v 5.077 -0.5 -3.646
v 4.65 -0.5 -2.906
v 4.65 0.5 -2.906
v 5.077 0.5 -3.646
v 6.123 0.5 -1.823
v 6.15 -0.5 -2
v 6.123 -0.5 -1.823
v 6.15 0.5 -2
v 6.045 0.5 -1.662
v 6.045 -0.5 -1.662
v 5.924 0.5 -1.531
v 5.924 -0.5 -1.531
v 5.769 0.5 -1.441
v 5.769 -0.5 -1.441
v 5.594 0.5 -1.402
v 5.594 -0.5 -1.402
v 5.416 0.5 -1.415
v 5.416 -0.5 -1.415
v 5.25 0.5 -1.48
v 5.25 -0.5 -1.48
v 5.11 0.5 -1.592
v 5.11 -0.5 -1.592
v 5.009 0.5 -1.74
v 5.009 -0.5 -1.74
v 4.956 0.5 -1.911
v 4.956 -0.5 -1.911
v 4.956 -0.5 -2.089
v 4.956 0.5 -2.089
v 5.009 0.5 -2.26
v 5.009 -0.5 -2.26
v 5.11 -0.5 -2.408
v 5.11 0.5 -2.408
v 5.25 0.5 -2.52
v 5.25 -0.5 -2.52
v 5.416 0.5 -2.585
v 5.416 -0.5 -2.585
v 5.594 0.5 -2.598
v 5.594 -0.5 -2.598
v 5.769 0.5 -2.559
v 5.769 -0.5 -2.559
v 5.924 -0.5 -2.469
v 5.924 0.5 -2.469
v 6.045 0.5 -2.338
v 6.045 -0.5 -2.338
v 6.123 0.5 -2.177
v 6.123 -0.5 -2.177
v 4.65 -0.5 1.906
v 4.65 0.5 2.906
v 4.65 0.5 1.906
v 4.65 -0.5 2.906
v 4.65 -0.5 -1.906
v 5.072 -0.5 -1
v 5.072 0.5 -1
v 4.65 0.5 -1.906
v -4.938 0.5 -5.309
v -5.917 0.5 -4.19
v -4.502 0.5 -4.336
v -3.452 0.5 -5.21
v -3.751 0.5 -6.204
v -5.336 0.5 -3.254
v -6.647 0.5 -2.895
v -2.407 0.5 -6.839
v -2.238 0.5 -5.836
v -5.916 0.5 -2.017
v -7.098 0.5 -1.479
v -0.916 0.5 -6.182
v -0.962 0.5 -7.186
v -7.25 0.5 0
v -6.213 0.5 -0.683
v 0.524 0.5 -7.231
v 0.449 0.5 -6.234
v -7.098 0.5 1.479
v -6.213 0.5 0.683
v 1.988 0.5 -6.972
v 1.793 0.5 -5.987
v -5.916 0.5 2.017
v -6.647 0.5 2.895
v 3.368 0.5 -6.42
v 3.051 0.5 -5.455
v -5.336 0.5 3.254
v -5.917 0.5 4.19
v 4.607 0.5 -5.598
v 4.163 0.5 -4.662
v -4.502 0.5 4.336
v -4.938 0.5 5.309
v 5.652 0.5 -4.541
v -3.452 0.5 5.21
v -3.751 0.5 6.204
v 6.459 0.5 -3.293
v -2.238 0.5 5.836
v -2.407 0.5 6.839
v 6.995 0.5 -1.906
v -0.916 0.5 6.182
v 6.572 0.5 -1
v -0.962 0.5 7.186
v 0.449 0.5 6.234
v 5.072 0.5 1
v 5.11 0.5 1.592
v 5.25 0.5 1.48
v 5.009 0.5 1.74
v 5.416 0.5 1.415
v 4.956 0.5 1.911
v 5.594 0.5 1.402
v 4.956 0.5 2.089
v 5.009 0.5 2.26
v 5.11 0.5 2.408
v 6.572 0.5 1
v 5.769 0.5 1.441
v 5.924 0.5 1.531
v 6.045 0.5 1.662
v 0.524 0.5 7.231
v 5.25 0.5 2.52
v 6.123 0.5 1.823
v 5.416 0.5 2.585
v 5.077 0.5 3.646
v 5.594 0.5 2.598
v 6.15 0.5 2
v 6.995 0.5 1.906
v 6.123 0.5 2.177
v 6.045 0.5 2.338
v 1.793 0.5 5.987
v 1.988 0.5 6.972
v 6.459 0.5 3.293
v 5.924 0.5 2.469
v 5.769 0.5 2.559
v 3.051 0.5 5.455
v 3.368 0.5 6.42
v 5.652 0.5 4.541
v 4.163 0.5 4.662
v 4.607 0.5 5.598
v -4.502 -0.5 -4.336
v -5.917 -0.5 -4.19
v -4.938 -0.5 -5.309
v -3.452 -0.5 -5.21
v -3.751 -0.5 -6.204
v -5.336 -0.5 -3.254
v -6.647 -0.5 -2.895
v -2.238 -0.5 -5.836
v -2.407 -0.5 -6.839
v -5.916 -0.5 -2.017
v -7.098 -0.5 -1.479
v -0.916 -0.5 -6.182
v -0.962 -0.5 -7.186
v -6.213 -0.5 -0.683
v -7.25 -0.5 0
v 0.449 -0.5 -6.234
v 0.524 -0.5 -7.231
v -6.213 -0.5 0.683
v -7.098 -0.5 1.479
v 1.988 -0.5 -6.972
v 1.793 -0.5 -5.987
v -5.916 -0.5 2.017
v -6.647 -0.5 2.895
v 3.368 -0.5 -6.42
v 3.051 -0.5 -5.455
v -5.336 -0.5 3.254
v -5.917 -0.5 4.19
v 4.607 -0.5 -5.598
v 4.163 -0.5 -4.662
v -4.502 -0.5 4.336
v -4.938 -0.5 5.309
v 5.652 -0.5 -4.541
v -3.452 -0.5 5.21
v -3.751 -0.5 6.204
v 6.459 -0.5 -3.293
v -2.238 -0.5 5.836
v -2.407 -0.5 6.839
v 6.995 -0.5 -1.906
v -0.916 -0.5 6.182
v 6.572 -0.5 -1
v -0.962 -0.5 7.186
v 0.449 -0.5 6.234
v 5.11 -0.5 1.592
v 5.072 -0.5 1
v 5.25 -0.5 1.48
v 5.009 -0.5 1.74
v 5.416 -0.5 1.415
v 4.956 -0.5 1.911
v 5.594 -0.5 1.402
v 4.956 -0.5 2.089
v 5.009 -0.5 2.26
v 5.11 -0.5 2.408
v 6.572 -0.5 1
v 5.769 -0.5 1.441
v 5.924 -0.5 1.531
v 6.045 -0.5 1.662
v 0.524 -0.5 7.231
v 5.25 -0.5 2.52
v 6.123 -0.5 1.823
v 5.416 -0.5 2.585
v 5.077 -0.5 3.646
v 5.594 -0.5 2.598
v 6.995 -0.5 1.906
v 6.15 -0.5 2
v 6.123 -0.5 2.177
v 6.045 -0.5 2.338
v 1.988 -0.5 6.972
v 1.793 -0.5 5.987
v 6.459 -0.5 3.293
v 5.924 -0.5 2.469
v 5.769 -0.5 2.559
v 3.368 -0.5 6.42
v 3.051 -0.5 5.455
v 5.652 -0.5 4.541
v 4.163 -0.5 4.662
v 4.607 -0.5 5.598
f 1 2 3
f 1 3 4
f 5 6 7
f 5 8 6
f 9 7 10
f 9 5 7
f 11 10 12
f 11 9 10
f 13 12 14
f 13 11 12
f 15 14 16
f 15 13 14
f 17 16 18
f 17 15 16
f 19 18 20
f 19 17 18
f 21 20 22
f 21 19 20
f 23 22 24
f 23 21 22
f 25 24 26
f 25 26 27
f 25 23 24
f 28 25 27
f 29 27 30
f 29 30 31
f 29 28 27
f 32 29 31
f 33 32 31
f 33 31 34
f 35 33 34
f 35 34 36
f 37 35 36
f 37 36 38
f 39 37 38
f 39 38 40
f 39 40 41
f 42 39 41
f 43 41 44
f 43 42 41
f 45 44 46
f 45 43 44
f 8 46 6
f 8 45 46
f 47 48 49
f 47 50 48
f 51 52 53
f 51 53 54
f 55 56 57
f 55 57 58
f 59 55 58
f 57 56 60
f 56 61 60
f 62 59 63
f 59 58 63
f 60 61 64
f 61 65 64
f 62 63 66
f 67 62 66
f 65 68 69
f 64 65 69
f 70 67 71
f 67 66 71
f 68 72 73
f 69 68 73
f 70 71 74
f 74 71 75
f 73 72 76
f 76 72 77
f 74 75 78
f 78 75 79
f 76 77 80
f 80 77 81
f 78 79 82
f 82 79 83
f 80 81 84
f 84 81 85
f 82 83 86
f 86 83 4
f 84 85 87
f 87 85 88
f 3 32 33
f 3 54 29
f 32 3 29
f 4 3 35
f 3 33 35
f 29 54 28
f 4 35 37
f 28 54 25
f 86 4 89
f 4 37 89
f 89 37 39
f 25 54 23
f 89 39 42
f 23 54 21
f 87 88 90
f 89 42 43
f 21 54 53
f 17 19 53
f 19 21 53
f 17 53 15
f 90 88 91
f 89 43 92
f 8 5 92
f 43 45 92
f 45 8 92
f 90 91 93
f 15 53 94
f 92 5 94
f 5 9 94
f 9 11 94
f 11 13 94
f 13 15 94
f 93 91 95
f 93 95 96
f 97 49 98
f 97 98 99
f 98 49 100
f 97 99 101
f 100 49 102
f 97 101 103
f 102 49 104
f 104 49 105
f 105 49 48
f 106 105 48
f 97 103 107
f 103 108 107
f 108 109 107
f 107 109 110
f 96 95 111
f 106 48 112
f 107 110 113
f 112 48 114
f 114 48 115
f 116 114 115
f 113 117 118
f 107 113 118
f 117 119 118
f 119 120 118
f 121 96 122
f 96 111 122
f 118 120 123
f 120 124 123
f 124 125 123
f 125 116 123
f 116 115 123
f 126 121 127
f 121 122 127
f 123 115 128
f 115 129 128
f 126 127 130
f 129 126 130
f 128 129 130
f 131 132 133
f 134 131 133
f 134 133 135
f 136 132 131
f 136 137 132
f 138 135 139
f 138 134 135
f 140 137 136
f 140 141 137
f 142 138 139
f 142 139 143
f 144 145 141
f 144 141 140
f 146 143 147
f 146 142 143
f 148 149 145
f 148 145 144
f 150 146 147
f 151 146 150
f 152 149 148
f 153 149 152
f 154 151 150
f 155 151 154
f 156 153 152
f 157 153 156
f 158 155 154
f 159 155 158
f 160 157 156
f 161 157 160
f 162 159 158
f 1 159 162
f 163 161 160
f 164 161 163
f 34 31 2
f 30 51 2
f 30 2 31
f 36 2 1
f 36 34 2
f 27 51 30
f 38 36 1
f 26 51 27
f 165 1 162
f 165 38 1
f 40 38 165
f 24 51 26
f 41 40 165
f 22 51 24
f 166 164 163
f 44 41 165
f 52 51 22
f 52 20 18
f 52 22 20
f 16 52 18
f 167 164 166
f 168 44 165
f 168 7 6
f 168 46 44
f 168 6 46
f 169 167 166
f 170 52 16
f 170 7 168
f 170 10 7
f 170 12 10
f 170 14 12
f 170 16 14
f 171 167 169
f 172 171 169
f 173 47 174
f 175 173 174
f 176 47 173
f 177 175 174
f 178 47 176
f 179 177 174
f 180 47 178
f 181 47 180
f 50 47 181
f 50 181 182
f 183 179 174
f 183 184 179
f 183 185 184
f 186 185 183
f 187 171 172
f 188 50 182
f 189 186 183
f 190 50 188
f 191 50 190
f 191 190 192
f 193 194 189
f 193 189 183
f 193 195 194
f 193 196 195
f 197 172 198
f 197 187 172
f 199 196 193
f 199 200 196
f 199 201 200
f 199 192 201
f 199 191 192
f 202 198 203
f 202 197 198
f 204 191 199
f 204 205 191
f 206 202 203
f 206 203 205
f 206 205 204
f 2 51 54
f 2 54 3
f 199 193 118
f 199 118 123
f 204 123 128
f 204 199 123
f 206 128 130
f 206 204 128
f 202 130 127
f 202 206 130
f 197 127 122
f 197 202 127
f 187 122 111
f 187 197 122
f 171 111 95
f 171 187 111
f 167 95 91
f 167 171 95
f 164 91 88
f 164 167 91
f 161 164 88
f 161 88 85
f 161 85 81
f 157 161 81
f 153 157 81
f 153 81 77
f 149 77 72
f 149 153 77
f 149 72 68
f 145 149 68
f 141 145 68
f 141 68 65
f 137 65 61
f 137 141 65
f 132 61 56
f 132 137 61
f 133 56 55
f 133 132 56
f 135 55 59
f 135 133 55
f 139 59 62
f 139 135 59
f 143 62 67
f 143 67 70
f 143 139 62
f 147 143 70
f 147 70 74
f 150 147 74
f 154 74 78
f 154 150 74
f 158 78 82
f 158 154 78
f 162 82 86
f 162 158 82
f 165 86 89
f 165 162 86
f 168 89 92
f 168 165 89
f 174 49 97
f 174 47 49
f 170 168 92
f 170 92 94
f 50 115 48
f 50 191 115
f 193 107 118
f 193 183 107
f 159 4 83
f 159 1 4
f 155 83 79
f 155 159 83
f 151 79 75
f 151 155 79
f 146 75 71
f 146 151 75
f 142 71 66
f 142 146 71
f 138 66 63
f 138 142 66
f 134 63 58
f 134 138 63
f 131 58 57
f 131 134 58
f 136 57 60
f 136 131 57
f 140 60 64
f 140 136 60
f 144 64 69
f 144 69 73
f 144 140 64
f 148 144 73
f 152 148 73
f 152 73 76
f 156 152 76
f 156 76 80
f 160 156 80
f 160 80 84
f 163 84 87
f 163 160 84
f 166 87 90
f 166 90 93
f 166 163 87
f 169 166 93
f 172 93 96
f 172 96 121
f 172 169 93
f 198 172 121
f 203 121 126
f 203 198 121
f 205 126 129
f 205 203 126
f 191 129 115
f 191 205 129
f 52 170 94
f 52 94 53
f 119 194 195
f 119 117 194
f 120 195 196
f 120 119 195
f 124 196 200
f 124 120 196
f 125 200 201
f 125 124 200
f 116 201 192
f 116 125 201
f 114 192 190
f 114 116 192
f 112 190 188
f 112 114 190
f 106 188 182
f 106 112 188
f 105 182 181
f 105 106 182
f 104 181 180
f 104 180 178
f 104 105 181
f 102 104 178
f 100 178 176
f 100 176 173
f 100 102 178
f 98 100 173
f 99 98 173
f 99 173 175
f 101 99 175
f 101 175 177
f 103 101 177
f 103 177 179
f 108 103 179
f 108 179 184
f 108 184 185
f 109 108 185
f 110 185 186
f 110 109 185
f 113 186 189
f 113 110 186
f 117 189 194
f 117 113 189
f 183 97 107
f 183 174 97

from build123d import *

# Parameters (mm, degrees)
F0_R     = 0.6
F1_DEPTH = 0.5


with BuildPart() as f1:
    # F0 (on Front) → F1 (new body, symmetric)
    with BuildSketch(Plane.XZ):
        with BuildLine():
            Line((6.572272, 1), (6.99489, 1.906308))
            ThreePointArc((6.99489, 1.906308), (-7.25, 0), (6.99489, -1.906308))
            Line((6.99489, -1.906308), (6.572272, -1))
            Line((6.572272, -1), (5.072272, -1))
            Line((5.072272, -1), (4.649654, -1.906308))
            Line((4.649654, -1.906308), (4.649654, -2.906308))
            Line((4.649654, -2.906308), (5.076546, -3.645707))
            ThreePointArc((5.076546, -3.645707), (-6.25, 0), (5.076546, 3.645707))
            Line((5.076546, 3.645707), (4.649654, 2.906308))
            Line((4.649654, 2.906308), (4.649654, 1.906308))
            Line((4.649654, 1.906308), (5.072272, 1))
            Line((5.072272, 1), (6.572272, 1))
        make_face()
        with Locations((5.549654, -2)):
            Circle(F0_R, mode=Mode.SUBTRACT)
        with Locations((5.549654, 2)):
            Circle(F0_R, mode=Mode.SUBTRACT)
    extrude(amount=F1_DEPTH, both=True)


solid = f1.part
